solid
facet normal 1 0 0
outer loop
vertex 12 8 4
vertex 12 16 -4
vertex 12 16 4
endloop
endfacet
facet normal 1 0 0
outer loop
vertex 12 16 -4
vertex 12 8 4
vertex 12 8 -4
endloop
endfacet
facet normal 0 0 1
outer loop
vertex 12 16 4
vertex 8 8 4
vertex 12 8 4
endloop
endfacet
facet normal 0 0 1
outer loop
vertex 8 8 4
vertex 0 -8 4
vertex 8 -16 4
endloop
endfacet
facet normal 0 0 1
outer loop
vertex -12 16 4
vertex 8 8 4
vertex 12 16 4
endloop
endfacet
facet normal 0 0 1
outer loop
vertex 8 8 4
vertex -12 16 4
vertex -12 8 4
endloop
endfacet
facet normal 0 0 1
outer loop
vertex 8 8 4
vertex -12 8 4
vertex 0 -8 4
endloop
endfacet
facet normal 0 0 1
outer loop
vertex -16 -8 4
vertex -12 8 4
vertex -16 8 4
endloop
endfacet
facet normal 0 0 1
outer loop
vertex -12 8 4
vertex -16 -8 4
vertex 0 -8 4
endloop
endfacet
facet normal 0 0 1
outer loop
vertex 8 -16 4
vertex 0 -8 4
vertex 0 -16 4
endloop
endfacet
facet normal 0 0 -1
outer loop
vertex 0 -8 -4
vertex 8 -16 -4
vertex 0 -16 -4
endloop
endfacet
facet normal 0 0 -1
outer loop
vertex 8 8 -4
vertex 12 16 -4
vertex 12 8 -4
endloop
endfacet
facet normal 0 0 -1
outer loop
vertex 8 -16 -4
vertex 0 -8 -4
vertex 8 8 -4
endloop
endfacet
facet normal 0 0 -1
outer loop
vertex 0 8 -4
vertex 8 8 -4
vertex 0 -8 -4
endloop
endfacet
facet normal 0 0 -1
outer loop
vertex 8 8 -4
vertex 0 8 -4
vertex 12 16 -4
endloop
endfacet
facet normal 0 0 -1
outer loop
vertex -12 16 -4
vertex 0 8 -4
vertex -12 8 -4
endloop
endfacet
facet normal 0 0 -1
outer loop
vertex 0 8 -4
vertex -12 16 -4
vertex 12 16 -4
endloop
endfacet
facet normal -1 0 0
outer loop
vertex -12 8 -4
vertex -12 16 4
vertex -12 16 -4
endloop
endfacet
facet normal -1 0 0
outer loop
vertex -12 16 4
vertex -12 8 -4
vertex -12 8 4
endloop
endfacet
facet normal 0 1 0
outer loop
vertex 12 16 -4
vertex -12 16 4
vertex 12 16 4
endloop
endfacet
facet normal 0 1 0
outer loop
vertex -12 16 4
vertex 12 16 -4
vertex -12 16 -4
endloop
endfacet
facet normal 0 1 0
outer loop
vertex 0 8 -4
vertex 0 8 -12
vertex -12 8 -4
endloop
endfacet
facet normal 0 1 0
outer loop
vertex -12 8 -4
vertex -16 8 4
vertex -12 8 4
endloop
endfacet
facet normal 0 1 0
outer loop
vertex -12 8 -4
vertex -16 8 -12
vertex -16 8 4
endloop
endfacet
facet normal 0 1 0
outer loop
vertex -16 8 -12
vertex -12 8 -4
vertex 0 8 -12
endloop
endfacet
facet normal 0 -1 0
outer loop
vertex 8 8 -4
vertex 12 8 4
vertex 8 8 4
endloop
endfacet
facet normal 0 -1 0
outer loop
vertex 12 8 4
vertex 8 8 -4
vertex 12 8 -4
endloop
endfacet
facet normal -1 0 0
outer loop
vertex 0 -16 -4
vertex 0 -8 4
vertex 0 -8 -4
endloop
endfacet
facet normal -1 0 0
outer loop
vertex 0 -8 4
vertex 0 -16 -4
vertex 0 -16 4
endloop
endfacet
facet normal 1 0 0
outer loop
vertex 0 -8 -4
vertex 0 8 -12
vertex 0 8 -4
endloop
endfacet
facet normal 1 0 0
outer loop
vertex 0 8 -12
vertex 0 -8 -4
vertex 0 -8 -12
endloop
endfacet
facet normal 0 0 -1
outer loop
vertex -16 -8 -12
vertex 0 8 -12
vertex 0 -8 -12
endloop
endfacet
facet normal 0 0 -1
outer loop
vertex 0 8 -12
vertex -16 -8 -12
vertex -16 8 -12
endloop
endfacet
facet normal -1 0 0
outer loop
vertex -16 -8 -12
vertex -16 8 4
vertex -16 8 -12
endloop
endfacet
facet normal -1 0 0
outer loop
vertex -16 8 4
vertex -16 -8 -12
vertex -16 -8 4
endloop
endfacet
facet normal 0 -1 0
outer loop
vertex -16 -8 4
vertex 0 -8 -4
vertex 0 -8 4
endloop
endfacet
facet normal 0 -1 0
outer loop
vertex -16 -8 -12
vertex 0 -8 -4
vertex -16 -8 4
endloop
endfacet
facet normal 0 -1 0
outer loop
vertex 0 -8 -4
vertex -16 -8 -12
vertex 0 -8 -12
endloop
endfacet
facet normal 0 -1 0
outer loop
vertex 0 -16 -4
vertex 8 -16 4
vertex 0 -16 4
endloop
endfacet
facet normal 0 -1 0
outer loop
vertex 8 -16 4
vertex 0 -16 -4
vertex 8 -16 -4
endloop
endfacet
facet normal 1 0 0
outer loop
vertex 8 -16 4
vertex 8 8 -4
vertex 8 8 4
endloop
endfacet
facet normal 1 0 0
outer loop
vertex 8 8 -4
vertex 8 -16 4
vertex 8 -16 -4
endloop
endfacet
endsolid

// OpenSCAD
size=32; //block=32 //item=8

translate([0,size*0.375,0]){
cube([size*0.75,size*0.25,size*0.25],center=true);
};
translate([-size*0.25,0,-size*0.125]){
cube([size*0.5,size*0.5,size*0.5],center=true);
};
translate([size*0.125,0,0]){
rotate([0,90,90]){
cube([size*0.25,size*0.25,size*1],center=true);
};
};
